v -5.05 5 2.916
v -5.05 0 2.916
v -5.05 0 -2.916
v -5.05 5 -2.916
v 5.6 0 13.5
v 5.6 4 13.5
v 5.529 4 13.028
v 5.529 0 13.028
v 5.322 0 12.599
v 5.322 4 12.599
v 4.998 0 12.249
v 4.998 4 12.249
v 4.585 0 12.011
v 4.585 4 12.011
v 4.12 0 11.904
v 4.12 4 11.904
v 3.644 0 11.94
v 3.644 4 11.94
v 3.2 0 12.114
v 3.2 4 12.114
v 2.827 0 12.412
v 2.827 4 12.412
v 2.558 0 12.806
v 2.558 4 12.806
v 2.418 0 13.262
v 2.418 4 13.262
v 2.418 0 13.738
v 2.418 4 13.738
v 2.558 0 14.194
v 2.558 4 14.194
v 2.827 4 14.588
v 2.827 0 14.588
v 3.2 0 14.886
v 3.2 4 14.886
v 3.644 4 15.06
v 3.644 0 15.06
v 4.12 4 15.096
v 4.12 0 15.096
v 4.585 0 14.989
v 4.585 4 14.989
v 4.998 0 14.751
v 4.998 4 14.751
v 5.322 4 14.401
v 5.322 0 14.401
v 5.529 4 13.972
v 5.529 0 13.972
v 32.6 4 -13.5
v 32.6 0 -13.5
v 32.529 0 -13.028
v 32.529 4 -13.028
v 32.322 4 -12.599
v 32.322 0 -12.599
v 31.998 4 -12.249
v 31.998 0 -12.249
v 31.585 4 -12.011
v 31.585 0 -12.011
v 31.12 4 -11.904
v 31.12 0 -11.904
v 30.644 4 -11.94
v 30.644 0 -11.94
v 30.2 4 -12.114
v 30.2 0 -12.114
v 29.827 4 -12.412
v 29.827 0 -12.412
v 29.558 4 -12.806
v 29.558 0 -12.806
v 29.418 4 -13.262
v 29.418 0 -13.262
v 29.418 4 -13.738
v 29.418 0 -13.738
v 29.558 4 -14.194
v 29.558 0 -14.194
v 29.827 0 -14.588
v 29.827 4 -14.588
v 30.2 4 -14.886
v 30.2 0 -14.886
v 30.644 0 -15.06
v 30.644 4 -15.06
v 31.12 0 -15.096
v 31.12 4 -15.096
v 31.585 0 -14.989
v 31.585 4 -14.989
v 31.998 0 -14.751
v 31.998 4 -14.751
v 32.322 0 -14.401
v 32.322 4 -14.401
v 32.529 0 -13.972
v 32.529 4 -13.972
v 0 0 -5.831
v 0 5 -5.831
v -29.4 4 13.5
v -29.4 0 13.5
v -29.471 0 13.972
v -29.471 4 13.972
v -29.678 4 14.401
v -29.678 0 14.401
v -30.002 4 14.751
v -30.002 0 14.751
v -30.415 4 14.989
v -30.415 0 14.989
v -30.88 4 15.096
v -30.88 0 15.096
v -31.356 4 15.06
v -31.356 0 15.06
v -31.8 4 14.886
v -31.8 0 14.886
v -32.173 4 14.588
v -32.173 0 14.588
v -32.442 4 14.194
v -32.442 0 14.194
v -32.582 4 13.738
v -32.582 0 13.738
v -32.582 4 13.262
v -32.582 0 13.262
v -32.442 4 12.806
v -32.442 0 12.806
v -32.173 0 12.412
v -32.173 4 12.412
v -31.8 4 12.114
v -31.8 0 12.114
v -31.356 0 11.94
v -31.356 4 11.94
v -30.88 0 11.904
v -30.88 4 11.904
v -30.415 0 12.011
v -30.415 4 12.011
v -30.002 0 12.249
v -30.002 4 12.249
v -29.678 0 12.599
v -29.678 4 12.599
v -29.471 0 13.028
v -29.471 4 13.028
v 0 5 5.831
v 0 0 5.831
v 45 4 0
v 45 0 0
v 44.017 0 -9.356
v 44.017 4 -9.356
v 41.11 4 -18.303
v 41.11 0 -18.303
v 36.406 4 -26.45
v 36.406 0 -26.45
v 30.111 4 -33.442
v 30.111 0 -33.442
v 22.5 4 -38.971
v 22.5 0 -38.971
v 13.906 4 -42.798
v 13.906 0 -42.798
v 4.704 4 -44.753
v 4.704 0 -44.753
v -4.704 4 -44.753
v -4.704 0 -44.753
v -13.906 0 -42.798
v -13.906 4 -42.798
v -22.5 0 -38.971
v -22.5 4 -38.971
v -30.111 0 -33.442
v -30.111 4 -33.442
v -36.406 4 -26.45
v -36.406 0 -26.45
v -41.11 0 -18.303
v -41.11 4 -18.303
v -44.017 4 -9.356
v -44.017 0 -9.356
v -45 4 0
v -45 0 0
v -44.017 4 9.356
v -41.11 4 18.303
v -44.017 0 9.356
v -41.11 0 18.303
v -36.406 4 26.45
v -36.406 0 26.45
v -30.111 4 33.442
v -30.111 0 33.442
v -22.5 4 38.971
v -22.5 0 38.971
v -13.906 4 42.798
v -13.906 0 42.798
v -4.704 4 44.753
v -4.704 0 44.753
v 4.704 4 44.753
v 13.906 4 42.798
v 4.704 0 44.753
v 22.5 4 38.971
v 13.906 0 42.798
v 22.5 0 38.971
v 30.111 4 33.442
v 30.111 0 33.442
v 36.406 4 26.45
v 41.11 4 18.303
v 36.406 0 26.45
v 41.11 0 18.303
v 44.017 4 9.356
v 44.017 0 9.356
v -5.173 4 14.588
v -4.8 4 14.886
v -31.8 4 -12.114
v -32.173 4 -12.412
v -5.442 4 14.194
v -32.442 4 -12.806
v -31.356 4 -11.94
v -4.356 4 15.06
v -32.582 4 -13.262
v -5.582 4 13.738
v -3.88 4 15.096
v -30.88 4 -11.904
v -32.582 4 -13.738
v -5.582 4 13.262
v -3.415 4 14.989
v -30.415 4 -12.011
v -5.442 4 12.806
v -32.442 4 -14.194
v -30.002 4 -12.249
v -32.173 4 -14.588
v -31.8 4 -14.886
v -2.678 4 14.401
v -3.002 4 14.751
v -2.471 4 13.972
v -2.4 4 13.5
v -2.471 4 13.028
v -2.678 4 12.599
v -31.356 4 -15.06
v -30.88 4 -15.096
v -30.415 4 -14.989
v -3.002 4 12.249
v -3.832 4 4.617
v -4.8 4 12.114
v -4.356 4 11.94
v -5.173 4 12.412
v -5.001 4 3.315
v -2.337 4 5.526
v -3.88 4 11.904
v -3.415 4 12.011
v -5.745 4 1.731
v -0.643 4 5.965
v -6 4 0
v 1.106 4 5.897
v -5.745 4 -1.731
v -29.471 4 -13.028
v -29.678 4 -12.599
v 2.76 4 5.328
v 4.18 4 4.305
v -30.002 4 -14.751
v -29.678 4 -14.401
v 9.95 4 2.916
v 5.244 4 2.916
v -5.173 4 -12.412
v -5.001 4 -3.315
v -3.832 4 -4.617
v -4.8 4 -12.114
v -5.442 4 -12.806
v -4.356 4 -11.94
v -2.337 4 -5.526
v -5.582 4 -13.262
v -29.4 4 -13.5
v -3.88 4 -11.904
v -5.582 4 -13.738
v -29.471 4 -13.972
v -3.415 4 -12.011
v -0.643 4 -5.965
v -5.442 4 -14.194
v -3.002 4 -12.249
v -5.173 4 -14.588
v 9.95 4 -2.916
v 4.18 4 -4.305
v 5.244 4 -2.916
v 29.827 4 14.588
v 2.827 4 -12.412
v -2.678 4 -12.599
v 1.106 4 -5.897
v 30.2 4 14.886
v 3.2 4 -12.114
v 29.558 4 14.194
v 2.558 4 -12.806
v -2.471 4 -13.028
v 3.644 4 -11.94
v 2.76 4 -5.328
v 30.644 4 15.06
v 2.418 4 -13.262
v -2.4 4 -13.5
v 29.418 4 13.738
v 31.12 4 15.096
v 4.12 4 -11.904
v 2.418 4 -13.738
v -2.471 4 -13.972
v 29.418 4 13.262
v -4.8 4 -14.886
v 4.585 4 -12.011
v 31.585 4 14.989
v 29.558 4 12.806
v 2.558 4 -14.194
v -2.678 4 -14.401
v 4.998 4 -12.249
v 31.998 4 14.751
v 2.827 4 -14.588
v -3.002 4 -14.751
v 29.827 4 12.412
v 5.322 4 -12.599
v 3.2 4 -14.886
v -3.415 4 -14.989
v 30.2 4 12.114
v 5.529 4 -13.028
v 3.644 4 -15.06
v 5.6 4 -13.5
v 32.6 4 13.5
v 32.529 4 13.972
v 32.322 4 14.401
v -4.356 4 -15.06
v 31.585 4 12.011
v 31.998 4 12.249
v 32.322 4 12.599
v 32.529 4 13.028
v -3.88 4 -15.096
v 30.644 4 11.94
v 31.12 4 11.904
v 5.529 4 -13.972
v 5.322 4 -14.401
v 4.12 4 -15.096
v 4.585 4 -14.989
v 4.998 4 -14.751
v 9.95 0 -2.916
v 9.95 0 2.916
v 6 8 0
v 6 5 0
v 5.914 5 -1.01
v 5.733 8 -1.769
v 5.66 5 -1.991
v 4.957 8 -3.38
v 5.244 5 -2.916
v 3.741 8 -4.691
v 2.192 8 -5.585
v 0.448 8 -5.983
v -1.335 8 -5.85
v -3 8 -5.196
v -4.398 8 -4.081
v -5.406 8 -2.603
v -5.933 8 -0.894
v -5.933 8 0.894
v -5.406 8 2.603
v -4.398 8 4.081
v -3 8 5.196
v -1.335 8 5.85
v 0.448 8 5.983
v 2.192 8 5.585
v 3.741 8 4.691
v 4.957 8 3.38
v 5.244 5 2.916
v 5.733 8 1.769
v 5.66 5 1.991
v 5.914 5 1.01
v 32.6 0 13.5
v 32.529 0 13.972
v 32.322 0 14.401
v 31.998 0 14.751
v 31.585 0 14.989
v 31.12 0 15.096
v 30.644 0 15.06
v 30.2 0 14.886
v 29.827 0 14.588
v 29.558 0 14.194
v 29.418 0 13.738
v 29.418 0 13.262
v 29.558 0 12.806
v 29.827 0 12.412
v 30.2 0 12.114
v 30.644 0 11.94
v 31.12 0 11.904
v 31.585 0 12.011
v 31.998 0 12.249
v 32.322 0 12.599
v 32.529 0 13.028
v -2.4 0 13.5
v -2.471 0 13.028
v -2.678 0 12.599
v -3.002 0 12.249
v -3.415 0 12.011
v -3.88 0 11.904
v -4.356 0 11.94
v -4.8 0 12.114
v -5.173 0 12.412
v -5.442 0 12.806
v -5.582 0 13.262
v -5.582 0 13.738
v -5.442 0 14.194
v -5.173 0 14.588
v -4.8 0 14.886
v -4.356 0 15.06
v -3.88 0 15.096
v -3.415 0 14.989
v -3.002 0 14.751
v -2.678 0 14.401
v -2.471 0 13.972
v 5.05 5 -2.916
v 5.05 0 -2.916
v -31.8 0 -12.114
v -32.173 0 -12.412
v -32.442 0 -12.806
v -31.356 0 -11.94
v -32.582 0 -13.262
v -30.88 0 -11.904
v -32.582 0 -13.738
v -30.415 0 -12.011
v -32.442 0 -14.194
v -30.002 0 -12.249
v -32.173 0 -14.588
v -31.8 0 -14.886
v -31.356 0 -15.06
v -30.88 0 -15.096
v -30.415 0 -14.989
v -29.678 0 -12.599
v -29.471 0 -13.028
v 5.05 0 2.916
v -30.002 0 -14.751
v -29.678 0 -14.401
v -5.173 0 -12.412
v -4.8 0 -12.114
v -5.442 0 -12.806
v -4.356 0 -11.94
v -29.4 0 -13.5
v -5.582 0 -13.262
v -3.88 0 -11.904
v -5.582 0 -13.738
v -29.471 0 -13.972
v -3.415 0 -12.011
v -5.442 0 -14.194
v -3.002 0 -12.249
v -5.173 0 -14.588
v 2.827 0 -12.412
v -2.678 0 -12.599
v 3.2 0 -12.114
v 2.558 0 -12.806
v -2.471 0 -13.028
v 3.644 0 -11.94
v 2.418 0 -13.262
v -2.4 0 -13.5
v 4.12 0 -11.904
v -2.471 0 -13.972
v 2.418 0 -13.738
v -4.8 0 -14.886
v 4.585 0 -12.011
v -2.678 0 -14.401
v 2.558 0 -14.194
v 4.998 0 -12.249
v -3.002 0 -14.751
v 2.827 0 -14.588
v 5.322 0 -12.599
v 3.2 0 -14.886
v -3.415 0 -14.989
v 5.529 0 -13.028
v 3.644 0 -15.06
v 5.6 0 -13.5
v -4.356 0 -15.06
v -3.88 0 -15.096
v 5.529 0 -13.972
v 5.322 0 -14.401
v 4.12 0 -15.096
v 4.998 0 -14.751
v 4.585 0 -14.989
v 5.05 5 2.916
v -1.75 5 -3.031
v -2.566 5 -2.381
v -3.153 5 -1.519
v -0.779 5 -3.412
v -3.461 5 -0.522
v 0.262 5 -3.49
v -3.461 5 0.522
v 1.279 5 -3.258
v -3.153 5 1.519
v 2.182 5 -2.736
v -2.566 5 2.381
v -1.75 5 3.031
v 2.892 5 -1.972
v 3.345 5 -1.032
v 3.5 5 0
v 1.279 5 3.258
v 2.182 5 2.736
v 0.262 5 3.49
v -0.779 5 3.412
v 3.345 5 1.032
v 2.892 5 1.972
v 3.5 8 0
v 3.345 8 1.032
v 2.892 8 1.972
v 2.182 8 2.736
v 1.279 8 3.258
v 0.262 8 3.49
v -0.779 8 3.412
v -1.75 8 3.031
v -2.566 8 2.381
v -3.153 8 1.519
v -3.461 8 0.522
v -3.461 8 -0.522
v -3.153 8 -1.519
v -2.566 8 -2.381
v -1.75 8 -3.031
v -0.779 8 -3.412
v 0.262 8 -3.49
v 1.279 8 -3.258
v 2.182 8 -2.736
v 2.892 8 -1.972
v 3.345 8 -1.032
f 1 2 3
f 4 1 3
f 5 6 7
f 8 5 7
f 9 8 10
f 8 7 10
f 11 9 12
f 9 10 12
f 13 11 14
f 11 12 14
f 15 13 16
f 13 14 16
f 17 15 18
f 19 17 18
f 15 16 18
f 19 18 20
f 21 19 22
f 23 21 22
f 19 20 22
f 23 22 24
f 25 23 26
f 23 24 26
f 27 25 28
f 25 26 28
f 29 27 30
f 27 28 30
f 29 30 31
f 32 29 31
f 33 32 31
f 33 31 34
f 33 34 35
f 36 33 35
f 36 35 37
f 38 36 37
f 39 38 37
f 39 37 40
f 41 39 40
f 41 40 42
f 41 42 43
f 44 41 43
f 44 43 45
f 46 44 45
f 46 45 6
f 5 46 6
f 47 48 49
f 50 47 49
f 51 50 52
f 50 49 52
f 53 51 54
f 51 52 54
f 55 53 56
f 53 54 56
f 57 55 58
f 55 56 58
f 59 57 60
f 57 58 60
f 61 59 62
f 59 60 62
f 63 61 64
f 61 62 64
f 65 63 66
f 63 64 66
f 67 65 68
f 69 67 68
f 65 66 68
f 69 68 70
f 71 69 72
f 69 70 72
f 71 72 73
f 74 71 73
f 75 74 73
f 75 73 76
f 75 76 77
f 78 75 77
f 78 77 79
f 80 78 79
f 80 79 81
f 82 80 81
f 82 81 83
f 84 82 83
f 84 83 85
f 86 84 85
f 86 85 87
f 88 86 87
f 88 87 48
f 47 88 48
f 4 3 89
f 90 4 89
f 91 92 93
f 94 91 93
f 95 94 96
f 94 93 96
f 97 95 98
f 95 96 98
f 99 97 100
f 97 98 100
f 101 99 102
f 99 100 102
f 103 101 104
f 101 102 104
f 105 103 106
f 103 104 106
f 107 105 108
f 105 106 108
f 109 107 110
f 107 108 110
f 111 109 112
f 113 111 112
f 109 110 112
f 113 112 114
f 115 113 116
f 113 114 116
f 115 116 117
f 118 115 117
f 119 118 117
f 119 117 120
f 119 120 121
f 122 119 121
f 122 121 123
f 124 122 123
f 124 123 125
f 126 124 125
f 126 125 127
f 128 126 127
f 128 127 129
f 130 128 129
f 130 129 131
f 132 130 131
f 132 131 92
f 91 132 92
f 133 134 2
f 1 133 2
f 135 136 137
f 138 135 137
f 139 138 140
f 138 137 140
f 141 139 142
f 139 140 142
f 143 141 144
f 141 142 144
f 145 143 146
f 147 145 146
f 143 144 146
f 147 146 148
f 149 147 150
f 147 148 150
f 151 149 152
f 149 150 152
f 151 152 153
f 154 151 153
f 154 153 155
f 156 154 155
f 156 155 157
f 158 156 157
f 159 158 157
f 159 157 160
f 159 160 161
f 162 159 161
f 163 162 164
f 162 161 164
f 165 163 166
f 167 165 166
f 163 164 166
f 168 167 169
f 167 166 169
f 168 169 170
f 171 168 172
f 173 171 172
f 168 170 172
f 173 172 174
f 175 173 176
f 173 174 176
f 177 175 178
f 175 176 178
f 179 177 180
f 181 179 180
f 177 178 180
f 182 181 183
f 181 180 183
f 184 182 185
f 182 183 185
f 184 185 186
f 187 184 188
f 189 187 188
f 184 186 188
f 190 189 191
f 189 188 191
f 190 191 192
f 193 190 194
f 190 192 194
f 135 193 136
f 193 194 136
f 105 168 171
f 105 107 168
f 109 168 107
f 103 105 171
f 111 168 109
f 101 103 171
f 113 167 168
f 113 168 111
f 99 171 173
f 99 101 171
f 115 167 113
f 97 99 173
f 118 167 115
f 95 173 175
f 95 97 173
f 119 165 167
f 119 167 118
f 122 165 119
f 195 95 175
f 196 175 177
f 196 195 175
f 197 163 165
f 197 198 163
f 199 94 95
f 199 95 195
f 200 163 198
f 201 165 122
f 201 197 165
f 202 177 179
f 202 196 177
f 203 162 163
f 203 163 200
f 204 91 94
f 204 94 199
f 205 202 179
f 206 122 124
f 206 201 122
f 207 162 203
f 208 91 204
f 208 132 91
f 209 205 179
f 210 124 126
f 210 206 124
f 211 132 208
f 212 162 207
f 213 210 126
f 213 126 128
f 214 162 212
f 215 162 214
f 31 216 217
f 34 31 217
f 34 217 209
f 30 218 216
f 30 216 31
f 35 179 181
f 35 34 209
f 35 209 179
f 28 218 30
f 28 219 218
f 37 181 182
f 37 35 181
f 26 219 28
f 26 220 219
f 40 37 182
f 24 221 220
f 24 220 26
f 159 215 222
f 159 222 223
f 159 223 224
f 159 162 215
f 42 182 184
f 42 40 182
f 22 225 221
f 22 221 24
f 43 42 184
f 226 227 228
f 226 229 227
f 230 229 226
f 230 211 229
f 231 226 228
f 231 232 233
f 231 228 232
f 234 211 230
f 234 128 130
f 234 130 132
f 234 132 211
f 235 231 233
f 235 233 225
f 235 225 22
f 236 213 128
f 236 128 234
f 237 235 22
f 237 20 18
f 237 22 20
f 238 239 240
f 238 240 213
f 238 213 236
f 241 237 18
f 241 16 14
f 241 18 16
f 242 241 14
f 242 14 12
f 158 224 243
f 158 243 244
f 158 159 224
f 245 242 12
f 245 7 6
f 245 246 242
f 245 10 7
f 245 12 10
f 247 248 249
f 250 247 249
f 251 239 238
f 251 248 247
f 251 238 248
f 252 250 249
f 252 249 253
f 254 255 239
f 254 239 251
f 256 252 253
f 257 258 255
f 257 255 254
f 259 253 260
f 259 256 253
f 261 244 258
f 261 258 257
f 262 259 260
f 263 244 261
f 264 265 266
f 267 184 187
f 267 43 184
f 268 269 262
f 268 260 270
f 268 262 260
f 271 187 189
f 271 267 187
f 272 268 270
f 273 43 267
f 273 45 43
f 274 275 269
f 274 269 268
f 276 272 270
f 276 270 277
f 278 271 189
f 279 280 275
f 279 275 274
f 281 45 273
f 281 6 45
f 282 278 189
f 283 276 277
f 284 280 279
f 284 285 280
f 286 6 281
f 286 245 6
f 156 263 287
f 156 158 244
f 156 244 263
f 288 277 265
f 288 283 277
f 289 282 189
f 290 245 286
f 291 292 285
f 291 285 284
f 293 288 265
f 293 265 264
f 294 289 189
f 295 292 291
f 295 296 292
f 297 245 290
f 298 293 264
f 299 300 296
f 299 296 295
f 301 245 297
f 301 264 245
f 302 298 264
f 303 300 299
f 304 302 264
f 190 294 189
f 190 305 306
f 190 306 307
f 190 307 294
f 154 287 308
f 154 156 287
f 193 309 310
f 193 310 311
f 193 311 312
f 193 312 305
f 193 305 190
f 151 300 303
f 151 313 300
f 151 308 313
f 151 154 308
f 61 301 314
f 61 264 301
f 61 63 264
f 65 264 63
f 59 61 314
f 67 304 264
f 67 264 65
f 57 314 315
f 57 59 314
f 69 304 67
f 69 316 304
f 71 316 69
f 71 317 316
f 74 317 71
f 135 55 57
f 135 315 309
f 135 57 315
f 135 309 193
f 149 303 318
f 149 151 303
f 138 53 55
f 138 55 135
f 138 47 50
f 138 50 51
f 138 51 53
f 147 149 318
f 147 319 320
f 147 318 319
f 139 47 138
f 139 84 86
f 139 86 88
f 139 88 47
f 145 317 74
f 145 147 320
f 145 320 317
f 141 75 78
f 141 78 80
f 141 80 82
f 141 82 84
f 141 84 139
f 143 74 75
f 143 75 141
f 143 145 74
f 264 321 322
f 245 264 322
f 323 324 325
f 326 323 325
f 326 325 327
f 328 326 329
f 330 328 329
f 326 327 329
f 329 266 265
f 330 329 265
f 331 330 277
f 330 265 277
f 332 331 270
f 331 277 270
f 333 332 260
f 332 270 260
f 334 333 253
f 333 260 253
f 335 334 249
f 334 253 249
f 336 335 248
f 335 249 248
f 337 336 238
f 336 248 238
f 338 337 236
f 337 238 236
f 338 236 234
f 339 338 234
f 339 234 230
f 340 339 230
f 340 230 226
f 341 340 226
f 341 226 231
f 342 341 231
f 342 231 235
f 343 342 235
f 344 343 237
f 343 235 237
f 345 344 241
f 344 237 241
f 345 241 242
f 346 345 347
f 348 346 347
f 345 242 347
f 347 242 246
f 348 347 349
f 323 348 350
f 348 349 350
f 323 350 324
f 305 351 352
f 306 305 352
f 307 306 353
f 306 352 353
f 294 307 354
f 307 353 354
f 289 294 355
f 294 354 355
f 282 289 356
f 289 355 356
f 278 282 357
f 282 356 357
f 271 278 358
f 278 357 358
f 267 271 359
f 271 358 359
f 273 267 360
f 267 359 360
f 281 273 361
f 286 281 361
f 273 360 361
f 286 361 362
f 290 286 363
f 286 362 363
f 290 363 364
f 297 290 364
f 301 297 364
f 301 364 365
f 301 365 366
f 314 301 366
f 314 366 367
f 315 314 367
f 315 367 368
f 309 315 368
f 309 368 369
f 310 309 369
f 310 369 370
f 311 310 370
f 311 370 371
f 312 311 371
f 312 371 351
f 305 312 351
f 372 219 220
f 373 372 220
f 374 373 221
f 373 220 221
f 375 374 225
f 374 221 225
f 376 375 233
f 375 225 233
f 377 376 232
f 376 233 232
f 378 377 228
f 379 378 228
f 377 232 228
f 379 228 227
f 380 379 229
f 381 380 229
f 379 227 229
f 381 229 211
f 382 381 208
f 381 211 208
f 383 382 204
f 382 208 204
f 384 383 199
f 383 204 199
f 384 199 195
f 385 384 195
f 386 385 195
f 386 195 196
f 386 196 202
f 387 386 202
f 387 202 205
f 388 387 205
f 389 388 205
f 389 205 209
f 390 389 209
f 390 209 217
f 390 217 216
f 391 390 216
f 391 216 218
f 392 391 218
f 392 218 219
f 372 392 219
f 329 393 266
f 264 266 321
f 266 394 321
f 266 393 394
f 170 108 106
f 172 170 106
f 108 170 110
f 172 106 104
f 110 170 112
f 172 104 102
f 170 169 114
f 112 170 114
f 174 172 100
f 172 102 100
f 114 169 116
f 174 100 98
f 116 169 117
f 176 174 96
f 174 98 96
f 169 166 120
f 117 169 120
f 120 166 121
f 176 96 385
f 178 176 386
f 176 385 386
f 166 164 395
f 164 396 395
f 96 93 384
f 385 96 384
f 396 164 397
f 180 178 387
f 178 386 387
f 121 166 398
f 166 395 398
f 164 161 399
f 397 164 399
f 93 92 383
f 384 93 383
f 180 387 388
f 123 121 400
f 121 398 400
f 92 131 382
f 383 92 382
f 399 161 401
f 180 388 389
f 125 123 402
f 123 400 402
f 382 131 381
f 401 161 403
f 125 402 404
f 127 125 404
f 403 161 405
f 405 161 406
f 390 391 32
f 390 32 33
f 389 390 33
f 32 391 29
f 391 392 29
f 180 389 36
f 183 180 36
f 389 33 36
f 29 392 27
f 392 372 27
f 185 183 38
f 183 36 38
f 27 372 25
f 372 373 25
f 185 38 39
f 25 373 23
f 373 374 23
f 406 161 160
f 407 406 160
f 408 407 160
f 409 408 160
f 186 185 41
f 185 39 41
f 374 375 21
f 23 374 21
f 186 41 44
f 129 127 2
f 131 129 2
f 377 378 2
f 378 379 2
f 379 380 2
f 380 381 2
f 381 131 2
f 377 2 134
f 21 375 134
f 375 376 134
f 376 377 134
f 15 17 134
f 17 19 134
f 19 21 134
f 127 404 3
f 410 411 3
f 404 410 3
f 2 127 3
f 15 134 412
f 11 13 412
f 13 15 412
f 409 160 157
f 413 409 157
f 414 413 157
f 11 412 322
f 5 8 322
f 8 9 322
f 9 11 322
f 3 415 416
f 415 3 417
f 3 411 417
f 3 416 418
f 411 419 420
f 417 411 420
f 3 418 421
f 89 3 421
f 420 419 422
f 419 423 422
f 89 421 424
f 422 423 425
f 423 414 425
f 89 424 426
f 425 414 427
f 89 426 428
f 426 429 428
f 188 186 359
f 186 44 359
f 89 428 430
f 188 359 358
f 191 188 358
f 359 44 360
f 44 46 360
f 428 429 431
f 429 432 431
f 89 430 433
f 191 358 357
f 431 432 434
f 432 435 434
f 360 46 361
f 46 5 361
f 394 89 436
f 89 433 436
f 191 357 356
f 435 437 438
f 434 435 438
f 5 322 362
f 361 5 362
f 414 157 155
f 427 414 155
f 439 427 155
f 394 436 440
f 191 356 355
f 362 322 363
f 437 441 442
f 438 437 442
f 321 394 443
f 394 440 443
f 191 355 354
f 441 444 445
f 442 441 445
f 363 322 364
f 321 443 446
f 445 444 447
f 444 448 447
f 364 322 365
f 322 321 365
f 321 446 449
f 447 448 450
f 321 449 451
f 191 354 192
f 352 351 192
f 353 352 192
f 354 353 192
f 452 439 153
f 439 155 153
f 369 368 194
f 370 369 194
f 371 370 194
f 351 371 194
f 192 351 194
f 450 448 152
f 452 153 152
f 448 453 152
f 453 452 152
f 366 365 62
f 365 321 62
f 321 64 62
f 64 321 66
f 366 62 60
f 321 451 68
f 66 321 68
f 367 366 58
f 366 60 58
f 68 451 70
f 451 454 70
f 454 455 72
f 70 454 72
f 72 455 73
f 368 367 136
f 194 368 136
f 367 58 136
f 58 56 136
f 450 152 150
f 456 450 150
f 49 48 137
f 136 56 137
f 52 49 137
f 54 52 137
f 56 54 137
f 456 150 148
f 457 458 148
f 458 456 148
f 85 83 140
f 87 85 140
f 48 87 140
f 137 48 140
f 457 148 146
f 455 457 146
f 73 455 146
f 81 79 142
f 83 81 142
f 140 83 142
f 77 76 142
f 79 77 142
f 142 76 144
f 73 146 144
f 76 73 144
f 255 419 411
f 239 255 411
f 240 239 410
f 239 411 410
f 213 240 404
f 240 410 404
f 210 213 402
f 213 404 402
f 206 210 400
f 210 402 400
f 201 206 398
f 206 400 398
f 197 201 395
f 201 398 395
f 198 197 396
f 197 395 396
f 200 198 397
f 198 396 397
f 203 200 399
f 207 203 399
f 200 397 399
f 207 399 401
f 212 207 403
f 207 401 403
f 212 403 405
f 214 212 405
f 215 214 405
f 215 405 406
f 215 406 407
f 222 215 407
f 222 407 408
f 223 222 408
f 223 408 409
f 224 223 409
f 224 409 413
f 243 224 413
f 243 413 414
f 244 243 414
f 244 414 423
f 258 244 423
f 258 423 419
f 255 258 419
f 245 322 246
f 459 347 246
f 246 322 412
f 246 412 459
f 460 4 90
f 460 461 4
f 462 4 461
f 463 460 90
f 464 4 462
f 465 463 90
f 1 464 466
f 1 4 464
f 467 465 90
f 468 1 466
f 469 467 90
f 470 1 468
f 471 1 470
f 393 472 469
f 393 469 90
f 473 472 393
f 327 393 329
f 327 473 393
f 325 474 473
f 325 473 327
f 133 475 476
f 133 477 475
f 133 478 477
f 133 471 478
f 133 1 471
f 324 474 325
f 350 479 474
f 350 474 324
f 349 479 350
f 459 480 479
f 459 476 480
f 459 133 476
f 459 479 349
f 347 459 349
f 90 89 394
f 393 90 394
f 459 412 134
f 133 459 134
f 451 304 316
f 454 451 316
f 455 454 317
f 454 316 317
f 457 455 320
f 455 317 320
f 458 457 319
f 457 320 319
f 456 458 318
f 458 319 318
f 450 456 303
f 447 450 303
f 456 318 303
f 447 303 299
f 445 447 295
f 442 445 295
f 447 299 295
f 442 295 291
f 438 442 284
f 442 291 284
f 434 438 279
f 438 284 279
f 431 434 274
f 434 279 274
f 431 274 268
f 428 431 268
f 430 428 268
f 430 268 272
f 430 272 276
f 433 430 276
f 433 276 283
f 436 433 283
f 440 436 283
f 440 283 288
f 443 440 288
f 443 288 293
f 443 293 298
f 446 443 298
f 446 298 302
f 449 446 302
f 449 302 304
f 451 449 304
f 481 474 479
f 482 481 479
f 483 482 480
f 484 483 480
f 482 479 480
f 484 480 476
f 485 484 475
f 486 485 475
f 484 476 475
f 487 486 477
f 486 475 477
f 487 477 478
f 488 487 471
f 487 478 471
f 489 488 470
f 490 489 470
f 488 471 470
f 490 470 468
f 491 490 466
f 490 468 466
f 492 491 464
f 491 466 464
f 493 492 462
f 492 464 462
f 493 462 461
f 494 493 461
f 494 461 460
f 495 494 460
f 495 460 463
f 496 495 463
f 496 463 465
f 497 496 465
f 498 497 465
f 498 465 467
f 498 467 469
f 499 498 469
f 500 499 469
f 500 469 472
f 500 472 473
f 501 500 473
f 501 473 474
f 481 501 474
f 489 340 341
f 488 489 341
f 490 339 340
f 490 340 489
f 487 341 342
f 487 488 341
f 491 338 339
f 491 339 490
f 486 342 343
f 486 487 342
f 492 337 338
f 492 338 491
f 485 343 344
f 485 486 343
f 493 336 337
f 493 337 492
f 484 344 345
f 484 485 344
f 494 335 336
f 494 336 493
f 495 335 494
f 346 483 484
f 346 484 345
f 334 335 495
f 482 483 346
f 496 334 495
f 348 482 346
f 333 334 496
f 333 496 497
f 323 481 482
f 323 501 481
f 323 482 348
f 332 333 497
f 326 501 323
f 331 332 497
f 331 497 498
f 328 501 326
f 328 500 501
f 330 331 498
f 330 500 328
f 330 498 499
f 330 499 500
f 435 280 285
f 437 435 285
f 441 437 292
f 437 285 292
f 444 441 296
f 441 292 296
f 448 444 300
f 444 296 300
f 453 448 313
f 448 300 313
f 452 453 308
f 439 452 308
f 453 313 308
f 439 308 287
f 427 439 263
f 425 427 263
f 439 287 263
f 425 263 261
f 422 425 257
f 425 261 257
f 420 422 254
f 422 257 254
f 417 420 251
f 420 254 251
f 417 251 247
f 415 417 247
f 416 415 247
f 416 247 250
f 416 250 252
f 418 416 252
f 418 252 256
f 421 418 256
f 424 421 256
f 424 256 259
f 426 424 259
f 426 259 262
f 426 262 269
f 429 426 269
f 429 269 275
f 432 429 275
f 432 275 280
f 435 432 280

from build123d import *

# Parameters (mm, degrees)
SKETCH_1_R          = 45
EXTRUDE_1_DEPTH     = 4
SKETCH_13_R         = 6
EXTRUDE_5_DEPTH     = 4
SKETCH_15_R         = 1.6
CUT_EXTRUDE_5_DEPTH = 5
CUT_EXTRUDE_6_DEPTH = 5
SKETCH_20_R         = 3.5
CUT_EXTRUDE_7_DEPTH = 5
SKETCH_21_R         = 1.6
CUT_EXTRUDE_8_DEPTH = 5


with BuildPart() as part:
    # Эскиз1 → Бобышка-Вытянуть1 (new body)
    with BuildSketch(Plane(origin=(0, 0, 0), x_dir=(1, 0, 0), z_dir=(0, 1, 0))):
        Circle(SKETCH_1_R)
    extrude(amount=EXTRUDE_1_DEPTH)

    # Эскиз13 → Бобышка-Вытянуть5 (add)
    with BuildSketch(Plane(origin=(0, 4, 0), x_dir=(1, 0, 0), z_dir=(0, 1, 0))):
        Circle(SKETCH_13_R)
    extrude(amount=EXTRUDE_5_DEPTH)

    # Эскиз15 → Вырез-Вытянуть5 (cut, through all)
    with BuildSketch(Plane(origin=(0, 4, 0), x_dir=(1, 0, 0), z_dir=(0, 1, 0))):
        with Locations((-4, 13.5)):
            Circle(SKETCH_15_R)
        with Locations((-4, -13.5)):
            Circle(SKETCH_15_R)
        with Locations((4, -13.5)):
            Circle(SKETCH_15_R)
        with Locations((4, 13.5)):
            Circle(SKETCH_15_R)
    extrude(amount=-CUT_EXTRUDE_5_DEPTH, mode=Mode.SUBTRACT)

    # Эскиз19 → Вырез-Вытянуть6 (cut)
    with BuildSketch(Plane.XZ):
        Polygon((5.05, 2.915618859), (0, 5.831237719), (-5.05, 2.915618859), (-5.05, -2.915618859), (0, -5.831237719), (5.05, -2.915618859), (9.95, -2.915618859), (9.95, 2.915618859), align=None)
    extrude(amount=-CUT_EXTRUDE_6_DEPTH, mode=Mode.SUBTRACT)

    # Эскиз20 → Вырез-Вытянуть7 (cut)
    with BuildSketch(Plane.XZ.offset(-5)):
        Circle(SKETCH_20_R)
    extrude(amount=-CUT_EXTRUDE_7_DEPTH, mode=Mode.SUBTRACT)

    # Эскиз21 → Вырез-Вытянуть8 (cut)
    with BuildSketch(Plane.XZ):
        with Locations((4, 13.5)):
            Circle(SKETCH_21_R)
        with Locations((4, -13.5)):
            Circle(SKETCH_21_R)
        with Locations((31, 13.5)):
            Circle(SKETCH_21_R)
        with Locations((31, -13.5)):
            Circle(SKETCH_21_R)
        with Locations((-31, 13.5)):
            Circle(SKETCH_21_R)
        with Locations((-31, -13.5)):
            Circle(SKETCH_21_R)
    extrude(amount=-CUT_EXTRUDE_8_DEPTH, mode=Mode.SUBTRACT)


solid = part.part
